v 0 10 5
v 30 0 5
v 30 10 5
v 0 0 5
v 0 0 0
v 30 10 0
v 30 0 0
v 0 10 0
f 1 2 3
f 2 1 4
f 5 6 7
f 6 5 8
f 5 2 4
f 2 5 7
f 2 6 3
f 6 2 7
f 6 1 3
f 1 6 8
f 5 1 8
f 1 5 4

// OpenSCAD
// resize(): scale a cube so its bounding box becomes 30×10×5.
resize([30, 10, 5]) cube(10);
